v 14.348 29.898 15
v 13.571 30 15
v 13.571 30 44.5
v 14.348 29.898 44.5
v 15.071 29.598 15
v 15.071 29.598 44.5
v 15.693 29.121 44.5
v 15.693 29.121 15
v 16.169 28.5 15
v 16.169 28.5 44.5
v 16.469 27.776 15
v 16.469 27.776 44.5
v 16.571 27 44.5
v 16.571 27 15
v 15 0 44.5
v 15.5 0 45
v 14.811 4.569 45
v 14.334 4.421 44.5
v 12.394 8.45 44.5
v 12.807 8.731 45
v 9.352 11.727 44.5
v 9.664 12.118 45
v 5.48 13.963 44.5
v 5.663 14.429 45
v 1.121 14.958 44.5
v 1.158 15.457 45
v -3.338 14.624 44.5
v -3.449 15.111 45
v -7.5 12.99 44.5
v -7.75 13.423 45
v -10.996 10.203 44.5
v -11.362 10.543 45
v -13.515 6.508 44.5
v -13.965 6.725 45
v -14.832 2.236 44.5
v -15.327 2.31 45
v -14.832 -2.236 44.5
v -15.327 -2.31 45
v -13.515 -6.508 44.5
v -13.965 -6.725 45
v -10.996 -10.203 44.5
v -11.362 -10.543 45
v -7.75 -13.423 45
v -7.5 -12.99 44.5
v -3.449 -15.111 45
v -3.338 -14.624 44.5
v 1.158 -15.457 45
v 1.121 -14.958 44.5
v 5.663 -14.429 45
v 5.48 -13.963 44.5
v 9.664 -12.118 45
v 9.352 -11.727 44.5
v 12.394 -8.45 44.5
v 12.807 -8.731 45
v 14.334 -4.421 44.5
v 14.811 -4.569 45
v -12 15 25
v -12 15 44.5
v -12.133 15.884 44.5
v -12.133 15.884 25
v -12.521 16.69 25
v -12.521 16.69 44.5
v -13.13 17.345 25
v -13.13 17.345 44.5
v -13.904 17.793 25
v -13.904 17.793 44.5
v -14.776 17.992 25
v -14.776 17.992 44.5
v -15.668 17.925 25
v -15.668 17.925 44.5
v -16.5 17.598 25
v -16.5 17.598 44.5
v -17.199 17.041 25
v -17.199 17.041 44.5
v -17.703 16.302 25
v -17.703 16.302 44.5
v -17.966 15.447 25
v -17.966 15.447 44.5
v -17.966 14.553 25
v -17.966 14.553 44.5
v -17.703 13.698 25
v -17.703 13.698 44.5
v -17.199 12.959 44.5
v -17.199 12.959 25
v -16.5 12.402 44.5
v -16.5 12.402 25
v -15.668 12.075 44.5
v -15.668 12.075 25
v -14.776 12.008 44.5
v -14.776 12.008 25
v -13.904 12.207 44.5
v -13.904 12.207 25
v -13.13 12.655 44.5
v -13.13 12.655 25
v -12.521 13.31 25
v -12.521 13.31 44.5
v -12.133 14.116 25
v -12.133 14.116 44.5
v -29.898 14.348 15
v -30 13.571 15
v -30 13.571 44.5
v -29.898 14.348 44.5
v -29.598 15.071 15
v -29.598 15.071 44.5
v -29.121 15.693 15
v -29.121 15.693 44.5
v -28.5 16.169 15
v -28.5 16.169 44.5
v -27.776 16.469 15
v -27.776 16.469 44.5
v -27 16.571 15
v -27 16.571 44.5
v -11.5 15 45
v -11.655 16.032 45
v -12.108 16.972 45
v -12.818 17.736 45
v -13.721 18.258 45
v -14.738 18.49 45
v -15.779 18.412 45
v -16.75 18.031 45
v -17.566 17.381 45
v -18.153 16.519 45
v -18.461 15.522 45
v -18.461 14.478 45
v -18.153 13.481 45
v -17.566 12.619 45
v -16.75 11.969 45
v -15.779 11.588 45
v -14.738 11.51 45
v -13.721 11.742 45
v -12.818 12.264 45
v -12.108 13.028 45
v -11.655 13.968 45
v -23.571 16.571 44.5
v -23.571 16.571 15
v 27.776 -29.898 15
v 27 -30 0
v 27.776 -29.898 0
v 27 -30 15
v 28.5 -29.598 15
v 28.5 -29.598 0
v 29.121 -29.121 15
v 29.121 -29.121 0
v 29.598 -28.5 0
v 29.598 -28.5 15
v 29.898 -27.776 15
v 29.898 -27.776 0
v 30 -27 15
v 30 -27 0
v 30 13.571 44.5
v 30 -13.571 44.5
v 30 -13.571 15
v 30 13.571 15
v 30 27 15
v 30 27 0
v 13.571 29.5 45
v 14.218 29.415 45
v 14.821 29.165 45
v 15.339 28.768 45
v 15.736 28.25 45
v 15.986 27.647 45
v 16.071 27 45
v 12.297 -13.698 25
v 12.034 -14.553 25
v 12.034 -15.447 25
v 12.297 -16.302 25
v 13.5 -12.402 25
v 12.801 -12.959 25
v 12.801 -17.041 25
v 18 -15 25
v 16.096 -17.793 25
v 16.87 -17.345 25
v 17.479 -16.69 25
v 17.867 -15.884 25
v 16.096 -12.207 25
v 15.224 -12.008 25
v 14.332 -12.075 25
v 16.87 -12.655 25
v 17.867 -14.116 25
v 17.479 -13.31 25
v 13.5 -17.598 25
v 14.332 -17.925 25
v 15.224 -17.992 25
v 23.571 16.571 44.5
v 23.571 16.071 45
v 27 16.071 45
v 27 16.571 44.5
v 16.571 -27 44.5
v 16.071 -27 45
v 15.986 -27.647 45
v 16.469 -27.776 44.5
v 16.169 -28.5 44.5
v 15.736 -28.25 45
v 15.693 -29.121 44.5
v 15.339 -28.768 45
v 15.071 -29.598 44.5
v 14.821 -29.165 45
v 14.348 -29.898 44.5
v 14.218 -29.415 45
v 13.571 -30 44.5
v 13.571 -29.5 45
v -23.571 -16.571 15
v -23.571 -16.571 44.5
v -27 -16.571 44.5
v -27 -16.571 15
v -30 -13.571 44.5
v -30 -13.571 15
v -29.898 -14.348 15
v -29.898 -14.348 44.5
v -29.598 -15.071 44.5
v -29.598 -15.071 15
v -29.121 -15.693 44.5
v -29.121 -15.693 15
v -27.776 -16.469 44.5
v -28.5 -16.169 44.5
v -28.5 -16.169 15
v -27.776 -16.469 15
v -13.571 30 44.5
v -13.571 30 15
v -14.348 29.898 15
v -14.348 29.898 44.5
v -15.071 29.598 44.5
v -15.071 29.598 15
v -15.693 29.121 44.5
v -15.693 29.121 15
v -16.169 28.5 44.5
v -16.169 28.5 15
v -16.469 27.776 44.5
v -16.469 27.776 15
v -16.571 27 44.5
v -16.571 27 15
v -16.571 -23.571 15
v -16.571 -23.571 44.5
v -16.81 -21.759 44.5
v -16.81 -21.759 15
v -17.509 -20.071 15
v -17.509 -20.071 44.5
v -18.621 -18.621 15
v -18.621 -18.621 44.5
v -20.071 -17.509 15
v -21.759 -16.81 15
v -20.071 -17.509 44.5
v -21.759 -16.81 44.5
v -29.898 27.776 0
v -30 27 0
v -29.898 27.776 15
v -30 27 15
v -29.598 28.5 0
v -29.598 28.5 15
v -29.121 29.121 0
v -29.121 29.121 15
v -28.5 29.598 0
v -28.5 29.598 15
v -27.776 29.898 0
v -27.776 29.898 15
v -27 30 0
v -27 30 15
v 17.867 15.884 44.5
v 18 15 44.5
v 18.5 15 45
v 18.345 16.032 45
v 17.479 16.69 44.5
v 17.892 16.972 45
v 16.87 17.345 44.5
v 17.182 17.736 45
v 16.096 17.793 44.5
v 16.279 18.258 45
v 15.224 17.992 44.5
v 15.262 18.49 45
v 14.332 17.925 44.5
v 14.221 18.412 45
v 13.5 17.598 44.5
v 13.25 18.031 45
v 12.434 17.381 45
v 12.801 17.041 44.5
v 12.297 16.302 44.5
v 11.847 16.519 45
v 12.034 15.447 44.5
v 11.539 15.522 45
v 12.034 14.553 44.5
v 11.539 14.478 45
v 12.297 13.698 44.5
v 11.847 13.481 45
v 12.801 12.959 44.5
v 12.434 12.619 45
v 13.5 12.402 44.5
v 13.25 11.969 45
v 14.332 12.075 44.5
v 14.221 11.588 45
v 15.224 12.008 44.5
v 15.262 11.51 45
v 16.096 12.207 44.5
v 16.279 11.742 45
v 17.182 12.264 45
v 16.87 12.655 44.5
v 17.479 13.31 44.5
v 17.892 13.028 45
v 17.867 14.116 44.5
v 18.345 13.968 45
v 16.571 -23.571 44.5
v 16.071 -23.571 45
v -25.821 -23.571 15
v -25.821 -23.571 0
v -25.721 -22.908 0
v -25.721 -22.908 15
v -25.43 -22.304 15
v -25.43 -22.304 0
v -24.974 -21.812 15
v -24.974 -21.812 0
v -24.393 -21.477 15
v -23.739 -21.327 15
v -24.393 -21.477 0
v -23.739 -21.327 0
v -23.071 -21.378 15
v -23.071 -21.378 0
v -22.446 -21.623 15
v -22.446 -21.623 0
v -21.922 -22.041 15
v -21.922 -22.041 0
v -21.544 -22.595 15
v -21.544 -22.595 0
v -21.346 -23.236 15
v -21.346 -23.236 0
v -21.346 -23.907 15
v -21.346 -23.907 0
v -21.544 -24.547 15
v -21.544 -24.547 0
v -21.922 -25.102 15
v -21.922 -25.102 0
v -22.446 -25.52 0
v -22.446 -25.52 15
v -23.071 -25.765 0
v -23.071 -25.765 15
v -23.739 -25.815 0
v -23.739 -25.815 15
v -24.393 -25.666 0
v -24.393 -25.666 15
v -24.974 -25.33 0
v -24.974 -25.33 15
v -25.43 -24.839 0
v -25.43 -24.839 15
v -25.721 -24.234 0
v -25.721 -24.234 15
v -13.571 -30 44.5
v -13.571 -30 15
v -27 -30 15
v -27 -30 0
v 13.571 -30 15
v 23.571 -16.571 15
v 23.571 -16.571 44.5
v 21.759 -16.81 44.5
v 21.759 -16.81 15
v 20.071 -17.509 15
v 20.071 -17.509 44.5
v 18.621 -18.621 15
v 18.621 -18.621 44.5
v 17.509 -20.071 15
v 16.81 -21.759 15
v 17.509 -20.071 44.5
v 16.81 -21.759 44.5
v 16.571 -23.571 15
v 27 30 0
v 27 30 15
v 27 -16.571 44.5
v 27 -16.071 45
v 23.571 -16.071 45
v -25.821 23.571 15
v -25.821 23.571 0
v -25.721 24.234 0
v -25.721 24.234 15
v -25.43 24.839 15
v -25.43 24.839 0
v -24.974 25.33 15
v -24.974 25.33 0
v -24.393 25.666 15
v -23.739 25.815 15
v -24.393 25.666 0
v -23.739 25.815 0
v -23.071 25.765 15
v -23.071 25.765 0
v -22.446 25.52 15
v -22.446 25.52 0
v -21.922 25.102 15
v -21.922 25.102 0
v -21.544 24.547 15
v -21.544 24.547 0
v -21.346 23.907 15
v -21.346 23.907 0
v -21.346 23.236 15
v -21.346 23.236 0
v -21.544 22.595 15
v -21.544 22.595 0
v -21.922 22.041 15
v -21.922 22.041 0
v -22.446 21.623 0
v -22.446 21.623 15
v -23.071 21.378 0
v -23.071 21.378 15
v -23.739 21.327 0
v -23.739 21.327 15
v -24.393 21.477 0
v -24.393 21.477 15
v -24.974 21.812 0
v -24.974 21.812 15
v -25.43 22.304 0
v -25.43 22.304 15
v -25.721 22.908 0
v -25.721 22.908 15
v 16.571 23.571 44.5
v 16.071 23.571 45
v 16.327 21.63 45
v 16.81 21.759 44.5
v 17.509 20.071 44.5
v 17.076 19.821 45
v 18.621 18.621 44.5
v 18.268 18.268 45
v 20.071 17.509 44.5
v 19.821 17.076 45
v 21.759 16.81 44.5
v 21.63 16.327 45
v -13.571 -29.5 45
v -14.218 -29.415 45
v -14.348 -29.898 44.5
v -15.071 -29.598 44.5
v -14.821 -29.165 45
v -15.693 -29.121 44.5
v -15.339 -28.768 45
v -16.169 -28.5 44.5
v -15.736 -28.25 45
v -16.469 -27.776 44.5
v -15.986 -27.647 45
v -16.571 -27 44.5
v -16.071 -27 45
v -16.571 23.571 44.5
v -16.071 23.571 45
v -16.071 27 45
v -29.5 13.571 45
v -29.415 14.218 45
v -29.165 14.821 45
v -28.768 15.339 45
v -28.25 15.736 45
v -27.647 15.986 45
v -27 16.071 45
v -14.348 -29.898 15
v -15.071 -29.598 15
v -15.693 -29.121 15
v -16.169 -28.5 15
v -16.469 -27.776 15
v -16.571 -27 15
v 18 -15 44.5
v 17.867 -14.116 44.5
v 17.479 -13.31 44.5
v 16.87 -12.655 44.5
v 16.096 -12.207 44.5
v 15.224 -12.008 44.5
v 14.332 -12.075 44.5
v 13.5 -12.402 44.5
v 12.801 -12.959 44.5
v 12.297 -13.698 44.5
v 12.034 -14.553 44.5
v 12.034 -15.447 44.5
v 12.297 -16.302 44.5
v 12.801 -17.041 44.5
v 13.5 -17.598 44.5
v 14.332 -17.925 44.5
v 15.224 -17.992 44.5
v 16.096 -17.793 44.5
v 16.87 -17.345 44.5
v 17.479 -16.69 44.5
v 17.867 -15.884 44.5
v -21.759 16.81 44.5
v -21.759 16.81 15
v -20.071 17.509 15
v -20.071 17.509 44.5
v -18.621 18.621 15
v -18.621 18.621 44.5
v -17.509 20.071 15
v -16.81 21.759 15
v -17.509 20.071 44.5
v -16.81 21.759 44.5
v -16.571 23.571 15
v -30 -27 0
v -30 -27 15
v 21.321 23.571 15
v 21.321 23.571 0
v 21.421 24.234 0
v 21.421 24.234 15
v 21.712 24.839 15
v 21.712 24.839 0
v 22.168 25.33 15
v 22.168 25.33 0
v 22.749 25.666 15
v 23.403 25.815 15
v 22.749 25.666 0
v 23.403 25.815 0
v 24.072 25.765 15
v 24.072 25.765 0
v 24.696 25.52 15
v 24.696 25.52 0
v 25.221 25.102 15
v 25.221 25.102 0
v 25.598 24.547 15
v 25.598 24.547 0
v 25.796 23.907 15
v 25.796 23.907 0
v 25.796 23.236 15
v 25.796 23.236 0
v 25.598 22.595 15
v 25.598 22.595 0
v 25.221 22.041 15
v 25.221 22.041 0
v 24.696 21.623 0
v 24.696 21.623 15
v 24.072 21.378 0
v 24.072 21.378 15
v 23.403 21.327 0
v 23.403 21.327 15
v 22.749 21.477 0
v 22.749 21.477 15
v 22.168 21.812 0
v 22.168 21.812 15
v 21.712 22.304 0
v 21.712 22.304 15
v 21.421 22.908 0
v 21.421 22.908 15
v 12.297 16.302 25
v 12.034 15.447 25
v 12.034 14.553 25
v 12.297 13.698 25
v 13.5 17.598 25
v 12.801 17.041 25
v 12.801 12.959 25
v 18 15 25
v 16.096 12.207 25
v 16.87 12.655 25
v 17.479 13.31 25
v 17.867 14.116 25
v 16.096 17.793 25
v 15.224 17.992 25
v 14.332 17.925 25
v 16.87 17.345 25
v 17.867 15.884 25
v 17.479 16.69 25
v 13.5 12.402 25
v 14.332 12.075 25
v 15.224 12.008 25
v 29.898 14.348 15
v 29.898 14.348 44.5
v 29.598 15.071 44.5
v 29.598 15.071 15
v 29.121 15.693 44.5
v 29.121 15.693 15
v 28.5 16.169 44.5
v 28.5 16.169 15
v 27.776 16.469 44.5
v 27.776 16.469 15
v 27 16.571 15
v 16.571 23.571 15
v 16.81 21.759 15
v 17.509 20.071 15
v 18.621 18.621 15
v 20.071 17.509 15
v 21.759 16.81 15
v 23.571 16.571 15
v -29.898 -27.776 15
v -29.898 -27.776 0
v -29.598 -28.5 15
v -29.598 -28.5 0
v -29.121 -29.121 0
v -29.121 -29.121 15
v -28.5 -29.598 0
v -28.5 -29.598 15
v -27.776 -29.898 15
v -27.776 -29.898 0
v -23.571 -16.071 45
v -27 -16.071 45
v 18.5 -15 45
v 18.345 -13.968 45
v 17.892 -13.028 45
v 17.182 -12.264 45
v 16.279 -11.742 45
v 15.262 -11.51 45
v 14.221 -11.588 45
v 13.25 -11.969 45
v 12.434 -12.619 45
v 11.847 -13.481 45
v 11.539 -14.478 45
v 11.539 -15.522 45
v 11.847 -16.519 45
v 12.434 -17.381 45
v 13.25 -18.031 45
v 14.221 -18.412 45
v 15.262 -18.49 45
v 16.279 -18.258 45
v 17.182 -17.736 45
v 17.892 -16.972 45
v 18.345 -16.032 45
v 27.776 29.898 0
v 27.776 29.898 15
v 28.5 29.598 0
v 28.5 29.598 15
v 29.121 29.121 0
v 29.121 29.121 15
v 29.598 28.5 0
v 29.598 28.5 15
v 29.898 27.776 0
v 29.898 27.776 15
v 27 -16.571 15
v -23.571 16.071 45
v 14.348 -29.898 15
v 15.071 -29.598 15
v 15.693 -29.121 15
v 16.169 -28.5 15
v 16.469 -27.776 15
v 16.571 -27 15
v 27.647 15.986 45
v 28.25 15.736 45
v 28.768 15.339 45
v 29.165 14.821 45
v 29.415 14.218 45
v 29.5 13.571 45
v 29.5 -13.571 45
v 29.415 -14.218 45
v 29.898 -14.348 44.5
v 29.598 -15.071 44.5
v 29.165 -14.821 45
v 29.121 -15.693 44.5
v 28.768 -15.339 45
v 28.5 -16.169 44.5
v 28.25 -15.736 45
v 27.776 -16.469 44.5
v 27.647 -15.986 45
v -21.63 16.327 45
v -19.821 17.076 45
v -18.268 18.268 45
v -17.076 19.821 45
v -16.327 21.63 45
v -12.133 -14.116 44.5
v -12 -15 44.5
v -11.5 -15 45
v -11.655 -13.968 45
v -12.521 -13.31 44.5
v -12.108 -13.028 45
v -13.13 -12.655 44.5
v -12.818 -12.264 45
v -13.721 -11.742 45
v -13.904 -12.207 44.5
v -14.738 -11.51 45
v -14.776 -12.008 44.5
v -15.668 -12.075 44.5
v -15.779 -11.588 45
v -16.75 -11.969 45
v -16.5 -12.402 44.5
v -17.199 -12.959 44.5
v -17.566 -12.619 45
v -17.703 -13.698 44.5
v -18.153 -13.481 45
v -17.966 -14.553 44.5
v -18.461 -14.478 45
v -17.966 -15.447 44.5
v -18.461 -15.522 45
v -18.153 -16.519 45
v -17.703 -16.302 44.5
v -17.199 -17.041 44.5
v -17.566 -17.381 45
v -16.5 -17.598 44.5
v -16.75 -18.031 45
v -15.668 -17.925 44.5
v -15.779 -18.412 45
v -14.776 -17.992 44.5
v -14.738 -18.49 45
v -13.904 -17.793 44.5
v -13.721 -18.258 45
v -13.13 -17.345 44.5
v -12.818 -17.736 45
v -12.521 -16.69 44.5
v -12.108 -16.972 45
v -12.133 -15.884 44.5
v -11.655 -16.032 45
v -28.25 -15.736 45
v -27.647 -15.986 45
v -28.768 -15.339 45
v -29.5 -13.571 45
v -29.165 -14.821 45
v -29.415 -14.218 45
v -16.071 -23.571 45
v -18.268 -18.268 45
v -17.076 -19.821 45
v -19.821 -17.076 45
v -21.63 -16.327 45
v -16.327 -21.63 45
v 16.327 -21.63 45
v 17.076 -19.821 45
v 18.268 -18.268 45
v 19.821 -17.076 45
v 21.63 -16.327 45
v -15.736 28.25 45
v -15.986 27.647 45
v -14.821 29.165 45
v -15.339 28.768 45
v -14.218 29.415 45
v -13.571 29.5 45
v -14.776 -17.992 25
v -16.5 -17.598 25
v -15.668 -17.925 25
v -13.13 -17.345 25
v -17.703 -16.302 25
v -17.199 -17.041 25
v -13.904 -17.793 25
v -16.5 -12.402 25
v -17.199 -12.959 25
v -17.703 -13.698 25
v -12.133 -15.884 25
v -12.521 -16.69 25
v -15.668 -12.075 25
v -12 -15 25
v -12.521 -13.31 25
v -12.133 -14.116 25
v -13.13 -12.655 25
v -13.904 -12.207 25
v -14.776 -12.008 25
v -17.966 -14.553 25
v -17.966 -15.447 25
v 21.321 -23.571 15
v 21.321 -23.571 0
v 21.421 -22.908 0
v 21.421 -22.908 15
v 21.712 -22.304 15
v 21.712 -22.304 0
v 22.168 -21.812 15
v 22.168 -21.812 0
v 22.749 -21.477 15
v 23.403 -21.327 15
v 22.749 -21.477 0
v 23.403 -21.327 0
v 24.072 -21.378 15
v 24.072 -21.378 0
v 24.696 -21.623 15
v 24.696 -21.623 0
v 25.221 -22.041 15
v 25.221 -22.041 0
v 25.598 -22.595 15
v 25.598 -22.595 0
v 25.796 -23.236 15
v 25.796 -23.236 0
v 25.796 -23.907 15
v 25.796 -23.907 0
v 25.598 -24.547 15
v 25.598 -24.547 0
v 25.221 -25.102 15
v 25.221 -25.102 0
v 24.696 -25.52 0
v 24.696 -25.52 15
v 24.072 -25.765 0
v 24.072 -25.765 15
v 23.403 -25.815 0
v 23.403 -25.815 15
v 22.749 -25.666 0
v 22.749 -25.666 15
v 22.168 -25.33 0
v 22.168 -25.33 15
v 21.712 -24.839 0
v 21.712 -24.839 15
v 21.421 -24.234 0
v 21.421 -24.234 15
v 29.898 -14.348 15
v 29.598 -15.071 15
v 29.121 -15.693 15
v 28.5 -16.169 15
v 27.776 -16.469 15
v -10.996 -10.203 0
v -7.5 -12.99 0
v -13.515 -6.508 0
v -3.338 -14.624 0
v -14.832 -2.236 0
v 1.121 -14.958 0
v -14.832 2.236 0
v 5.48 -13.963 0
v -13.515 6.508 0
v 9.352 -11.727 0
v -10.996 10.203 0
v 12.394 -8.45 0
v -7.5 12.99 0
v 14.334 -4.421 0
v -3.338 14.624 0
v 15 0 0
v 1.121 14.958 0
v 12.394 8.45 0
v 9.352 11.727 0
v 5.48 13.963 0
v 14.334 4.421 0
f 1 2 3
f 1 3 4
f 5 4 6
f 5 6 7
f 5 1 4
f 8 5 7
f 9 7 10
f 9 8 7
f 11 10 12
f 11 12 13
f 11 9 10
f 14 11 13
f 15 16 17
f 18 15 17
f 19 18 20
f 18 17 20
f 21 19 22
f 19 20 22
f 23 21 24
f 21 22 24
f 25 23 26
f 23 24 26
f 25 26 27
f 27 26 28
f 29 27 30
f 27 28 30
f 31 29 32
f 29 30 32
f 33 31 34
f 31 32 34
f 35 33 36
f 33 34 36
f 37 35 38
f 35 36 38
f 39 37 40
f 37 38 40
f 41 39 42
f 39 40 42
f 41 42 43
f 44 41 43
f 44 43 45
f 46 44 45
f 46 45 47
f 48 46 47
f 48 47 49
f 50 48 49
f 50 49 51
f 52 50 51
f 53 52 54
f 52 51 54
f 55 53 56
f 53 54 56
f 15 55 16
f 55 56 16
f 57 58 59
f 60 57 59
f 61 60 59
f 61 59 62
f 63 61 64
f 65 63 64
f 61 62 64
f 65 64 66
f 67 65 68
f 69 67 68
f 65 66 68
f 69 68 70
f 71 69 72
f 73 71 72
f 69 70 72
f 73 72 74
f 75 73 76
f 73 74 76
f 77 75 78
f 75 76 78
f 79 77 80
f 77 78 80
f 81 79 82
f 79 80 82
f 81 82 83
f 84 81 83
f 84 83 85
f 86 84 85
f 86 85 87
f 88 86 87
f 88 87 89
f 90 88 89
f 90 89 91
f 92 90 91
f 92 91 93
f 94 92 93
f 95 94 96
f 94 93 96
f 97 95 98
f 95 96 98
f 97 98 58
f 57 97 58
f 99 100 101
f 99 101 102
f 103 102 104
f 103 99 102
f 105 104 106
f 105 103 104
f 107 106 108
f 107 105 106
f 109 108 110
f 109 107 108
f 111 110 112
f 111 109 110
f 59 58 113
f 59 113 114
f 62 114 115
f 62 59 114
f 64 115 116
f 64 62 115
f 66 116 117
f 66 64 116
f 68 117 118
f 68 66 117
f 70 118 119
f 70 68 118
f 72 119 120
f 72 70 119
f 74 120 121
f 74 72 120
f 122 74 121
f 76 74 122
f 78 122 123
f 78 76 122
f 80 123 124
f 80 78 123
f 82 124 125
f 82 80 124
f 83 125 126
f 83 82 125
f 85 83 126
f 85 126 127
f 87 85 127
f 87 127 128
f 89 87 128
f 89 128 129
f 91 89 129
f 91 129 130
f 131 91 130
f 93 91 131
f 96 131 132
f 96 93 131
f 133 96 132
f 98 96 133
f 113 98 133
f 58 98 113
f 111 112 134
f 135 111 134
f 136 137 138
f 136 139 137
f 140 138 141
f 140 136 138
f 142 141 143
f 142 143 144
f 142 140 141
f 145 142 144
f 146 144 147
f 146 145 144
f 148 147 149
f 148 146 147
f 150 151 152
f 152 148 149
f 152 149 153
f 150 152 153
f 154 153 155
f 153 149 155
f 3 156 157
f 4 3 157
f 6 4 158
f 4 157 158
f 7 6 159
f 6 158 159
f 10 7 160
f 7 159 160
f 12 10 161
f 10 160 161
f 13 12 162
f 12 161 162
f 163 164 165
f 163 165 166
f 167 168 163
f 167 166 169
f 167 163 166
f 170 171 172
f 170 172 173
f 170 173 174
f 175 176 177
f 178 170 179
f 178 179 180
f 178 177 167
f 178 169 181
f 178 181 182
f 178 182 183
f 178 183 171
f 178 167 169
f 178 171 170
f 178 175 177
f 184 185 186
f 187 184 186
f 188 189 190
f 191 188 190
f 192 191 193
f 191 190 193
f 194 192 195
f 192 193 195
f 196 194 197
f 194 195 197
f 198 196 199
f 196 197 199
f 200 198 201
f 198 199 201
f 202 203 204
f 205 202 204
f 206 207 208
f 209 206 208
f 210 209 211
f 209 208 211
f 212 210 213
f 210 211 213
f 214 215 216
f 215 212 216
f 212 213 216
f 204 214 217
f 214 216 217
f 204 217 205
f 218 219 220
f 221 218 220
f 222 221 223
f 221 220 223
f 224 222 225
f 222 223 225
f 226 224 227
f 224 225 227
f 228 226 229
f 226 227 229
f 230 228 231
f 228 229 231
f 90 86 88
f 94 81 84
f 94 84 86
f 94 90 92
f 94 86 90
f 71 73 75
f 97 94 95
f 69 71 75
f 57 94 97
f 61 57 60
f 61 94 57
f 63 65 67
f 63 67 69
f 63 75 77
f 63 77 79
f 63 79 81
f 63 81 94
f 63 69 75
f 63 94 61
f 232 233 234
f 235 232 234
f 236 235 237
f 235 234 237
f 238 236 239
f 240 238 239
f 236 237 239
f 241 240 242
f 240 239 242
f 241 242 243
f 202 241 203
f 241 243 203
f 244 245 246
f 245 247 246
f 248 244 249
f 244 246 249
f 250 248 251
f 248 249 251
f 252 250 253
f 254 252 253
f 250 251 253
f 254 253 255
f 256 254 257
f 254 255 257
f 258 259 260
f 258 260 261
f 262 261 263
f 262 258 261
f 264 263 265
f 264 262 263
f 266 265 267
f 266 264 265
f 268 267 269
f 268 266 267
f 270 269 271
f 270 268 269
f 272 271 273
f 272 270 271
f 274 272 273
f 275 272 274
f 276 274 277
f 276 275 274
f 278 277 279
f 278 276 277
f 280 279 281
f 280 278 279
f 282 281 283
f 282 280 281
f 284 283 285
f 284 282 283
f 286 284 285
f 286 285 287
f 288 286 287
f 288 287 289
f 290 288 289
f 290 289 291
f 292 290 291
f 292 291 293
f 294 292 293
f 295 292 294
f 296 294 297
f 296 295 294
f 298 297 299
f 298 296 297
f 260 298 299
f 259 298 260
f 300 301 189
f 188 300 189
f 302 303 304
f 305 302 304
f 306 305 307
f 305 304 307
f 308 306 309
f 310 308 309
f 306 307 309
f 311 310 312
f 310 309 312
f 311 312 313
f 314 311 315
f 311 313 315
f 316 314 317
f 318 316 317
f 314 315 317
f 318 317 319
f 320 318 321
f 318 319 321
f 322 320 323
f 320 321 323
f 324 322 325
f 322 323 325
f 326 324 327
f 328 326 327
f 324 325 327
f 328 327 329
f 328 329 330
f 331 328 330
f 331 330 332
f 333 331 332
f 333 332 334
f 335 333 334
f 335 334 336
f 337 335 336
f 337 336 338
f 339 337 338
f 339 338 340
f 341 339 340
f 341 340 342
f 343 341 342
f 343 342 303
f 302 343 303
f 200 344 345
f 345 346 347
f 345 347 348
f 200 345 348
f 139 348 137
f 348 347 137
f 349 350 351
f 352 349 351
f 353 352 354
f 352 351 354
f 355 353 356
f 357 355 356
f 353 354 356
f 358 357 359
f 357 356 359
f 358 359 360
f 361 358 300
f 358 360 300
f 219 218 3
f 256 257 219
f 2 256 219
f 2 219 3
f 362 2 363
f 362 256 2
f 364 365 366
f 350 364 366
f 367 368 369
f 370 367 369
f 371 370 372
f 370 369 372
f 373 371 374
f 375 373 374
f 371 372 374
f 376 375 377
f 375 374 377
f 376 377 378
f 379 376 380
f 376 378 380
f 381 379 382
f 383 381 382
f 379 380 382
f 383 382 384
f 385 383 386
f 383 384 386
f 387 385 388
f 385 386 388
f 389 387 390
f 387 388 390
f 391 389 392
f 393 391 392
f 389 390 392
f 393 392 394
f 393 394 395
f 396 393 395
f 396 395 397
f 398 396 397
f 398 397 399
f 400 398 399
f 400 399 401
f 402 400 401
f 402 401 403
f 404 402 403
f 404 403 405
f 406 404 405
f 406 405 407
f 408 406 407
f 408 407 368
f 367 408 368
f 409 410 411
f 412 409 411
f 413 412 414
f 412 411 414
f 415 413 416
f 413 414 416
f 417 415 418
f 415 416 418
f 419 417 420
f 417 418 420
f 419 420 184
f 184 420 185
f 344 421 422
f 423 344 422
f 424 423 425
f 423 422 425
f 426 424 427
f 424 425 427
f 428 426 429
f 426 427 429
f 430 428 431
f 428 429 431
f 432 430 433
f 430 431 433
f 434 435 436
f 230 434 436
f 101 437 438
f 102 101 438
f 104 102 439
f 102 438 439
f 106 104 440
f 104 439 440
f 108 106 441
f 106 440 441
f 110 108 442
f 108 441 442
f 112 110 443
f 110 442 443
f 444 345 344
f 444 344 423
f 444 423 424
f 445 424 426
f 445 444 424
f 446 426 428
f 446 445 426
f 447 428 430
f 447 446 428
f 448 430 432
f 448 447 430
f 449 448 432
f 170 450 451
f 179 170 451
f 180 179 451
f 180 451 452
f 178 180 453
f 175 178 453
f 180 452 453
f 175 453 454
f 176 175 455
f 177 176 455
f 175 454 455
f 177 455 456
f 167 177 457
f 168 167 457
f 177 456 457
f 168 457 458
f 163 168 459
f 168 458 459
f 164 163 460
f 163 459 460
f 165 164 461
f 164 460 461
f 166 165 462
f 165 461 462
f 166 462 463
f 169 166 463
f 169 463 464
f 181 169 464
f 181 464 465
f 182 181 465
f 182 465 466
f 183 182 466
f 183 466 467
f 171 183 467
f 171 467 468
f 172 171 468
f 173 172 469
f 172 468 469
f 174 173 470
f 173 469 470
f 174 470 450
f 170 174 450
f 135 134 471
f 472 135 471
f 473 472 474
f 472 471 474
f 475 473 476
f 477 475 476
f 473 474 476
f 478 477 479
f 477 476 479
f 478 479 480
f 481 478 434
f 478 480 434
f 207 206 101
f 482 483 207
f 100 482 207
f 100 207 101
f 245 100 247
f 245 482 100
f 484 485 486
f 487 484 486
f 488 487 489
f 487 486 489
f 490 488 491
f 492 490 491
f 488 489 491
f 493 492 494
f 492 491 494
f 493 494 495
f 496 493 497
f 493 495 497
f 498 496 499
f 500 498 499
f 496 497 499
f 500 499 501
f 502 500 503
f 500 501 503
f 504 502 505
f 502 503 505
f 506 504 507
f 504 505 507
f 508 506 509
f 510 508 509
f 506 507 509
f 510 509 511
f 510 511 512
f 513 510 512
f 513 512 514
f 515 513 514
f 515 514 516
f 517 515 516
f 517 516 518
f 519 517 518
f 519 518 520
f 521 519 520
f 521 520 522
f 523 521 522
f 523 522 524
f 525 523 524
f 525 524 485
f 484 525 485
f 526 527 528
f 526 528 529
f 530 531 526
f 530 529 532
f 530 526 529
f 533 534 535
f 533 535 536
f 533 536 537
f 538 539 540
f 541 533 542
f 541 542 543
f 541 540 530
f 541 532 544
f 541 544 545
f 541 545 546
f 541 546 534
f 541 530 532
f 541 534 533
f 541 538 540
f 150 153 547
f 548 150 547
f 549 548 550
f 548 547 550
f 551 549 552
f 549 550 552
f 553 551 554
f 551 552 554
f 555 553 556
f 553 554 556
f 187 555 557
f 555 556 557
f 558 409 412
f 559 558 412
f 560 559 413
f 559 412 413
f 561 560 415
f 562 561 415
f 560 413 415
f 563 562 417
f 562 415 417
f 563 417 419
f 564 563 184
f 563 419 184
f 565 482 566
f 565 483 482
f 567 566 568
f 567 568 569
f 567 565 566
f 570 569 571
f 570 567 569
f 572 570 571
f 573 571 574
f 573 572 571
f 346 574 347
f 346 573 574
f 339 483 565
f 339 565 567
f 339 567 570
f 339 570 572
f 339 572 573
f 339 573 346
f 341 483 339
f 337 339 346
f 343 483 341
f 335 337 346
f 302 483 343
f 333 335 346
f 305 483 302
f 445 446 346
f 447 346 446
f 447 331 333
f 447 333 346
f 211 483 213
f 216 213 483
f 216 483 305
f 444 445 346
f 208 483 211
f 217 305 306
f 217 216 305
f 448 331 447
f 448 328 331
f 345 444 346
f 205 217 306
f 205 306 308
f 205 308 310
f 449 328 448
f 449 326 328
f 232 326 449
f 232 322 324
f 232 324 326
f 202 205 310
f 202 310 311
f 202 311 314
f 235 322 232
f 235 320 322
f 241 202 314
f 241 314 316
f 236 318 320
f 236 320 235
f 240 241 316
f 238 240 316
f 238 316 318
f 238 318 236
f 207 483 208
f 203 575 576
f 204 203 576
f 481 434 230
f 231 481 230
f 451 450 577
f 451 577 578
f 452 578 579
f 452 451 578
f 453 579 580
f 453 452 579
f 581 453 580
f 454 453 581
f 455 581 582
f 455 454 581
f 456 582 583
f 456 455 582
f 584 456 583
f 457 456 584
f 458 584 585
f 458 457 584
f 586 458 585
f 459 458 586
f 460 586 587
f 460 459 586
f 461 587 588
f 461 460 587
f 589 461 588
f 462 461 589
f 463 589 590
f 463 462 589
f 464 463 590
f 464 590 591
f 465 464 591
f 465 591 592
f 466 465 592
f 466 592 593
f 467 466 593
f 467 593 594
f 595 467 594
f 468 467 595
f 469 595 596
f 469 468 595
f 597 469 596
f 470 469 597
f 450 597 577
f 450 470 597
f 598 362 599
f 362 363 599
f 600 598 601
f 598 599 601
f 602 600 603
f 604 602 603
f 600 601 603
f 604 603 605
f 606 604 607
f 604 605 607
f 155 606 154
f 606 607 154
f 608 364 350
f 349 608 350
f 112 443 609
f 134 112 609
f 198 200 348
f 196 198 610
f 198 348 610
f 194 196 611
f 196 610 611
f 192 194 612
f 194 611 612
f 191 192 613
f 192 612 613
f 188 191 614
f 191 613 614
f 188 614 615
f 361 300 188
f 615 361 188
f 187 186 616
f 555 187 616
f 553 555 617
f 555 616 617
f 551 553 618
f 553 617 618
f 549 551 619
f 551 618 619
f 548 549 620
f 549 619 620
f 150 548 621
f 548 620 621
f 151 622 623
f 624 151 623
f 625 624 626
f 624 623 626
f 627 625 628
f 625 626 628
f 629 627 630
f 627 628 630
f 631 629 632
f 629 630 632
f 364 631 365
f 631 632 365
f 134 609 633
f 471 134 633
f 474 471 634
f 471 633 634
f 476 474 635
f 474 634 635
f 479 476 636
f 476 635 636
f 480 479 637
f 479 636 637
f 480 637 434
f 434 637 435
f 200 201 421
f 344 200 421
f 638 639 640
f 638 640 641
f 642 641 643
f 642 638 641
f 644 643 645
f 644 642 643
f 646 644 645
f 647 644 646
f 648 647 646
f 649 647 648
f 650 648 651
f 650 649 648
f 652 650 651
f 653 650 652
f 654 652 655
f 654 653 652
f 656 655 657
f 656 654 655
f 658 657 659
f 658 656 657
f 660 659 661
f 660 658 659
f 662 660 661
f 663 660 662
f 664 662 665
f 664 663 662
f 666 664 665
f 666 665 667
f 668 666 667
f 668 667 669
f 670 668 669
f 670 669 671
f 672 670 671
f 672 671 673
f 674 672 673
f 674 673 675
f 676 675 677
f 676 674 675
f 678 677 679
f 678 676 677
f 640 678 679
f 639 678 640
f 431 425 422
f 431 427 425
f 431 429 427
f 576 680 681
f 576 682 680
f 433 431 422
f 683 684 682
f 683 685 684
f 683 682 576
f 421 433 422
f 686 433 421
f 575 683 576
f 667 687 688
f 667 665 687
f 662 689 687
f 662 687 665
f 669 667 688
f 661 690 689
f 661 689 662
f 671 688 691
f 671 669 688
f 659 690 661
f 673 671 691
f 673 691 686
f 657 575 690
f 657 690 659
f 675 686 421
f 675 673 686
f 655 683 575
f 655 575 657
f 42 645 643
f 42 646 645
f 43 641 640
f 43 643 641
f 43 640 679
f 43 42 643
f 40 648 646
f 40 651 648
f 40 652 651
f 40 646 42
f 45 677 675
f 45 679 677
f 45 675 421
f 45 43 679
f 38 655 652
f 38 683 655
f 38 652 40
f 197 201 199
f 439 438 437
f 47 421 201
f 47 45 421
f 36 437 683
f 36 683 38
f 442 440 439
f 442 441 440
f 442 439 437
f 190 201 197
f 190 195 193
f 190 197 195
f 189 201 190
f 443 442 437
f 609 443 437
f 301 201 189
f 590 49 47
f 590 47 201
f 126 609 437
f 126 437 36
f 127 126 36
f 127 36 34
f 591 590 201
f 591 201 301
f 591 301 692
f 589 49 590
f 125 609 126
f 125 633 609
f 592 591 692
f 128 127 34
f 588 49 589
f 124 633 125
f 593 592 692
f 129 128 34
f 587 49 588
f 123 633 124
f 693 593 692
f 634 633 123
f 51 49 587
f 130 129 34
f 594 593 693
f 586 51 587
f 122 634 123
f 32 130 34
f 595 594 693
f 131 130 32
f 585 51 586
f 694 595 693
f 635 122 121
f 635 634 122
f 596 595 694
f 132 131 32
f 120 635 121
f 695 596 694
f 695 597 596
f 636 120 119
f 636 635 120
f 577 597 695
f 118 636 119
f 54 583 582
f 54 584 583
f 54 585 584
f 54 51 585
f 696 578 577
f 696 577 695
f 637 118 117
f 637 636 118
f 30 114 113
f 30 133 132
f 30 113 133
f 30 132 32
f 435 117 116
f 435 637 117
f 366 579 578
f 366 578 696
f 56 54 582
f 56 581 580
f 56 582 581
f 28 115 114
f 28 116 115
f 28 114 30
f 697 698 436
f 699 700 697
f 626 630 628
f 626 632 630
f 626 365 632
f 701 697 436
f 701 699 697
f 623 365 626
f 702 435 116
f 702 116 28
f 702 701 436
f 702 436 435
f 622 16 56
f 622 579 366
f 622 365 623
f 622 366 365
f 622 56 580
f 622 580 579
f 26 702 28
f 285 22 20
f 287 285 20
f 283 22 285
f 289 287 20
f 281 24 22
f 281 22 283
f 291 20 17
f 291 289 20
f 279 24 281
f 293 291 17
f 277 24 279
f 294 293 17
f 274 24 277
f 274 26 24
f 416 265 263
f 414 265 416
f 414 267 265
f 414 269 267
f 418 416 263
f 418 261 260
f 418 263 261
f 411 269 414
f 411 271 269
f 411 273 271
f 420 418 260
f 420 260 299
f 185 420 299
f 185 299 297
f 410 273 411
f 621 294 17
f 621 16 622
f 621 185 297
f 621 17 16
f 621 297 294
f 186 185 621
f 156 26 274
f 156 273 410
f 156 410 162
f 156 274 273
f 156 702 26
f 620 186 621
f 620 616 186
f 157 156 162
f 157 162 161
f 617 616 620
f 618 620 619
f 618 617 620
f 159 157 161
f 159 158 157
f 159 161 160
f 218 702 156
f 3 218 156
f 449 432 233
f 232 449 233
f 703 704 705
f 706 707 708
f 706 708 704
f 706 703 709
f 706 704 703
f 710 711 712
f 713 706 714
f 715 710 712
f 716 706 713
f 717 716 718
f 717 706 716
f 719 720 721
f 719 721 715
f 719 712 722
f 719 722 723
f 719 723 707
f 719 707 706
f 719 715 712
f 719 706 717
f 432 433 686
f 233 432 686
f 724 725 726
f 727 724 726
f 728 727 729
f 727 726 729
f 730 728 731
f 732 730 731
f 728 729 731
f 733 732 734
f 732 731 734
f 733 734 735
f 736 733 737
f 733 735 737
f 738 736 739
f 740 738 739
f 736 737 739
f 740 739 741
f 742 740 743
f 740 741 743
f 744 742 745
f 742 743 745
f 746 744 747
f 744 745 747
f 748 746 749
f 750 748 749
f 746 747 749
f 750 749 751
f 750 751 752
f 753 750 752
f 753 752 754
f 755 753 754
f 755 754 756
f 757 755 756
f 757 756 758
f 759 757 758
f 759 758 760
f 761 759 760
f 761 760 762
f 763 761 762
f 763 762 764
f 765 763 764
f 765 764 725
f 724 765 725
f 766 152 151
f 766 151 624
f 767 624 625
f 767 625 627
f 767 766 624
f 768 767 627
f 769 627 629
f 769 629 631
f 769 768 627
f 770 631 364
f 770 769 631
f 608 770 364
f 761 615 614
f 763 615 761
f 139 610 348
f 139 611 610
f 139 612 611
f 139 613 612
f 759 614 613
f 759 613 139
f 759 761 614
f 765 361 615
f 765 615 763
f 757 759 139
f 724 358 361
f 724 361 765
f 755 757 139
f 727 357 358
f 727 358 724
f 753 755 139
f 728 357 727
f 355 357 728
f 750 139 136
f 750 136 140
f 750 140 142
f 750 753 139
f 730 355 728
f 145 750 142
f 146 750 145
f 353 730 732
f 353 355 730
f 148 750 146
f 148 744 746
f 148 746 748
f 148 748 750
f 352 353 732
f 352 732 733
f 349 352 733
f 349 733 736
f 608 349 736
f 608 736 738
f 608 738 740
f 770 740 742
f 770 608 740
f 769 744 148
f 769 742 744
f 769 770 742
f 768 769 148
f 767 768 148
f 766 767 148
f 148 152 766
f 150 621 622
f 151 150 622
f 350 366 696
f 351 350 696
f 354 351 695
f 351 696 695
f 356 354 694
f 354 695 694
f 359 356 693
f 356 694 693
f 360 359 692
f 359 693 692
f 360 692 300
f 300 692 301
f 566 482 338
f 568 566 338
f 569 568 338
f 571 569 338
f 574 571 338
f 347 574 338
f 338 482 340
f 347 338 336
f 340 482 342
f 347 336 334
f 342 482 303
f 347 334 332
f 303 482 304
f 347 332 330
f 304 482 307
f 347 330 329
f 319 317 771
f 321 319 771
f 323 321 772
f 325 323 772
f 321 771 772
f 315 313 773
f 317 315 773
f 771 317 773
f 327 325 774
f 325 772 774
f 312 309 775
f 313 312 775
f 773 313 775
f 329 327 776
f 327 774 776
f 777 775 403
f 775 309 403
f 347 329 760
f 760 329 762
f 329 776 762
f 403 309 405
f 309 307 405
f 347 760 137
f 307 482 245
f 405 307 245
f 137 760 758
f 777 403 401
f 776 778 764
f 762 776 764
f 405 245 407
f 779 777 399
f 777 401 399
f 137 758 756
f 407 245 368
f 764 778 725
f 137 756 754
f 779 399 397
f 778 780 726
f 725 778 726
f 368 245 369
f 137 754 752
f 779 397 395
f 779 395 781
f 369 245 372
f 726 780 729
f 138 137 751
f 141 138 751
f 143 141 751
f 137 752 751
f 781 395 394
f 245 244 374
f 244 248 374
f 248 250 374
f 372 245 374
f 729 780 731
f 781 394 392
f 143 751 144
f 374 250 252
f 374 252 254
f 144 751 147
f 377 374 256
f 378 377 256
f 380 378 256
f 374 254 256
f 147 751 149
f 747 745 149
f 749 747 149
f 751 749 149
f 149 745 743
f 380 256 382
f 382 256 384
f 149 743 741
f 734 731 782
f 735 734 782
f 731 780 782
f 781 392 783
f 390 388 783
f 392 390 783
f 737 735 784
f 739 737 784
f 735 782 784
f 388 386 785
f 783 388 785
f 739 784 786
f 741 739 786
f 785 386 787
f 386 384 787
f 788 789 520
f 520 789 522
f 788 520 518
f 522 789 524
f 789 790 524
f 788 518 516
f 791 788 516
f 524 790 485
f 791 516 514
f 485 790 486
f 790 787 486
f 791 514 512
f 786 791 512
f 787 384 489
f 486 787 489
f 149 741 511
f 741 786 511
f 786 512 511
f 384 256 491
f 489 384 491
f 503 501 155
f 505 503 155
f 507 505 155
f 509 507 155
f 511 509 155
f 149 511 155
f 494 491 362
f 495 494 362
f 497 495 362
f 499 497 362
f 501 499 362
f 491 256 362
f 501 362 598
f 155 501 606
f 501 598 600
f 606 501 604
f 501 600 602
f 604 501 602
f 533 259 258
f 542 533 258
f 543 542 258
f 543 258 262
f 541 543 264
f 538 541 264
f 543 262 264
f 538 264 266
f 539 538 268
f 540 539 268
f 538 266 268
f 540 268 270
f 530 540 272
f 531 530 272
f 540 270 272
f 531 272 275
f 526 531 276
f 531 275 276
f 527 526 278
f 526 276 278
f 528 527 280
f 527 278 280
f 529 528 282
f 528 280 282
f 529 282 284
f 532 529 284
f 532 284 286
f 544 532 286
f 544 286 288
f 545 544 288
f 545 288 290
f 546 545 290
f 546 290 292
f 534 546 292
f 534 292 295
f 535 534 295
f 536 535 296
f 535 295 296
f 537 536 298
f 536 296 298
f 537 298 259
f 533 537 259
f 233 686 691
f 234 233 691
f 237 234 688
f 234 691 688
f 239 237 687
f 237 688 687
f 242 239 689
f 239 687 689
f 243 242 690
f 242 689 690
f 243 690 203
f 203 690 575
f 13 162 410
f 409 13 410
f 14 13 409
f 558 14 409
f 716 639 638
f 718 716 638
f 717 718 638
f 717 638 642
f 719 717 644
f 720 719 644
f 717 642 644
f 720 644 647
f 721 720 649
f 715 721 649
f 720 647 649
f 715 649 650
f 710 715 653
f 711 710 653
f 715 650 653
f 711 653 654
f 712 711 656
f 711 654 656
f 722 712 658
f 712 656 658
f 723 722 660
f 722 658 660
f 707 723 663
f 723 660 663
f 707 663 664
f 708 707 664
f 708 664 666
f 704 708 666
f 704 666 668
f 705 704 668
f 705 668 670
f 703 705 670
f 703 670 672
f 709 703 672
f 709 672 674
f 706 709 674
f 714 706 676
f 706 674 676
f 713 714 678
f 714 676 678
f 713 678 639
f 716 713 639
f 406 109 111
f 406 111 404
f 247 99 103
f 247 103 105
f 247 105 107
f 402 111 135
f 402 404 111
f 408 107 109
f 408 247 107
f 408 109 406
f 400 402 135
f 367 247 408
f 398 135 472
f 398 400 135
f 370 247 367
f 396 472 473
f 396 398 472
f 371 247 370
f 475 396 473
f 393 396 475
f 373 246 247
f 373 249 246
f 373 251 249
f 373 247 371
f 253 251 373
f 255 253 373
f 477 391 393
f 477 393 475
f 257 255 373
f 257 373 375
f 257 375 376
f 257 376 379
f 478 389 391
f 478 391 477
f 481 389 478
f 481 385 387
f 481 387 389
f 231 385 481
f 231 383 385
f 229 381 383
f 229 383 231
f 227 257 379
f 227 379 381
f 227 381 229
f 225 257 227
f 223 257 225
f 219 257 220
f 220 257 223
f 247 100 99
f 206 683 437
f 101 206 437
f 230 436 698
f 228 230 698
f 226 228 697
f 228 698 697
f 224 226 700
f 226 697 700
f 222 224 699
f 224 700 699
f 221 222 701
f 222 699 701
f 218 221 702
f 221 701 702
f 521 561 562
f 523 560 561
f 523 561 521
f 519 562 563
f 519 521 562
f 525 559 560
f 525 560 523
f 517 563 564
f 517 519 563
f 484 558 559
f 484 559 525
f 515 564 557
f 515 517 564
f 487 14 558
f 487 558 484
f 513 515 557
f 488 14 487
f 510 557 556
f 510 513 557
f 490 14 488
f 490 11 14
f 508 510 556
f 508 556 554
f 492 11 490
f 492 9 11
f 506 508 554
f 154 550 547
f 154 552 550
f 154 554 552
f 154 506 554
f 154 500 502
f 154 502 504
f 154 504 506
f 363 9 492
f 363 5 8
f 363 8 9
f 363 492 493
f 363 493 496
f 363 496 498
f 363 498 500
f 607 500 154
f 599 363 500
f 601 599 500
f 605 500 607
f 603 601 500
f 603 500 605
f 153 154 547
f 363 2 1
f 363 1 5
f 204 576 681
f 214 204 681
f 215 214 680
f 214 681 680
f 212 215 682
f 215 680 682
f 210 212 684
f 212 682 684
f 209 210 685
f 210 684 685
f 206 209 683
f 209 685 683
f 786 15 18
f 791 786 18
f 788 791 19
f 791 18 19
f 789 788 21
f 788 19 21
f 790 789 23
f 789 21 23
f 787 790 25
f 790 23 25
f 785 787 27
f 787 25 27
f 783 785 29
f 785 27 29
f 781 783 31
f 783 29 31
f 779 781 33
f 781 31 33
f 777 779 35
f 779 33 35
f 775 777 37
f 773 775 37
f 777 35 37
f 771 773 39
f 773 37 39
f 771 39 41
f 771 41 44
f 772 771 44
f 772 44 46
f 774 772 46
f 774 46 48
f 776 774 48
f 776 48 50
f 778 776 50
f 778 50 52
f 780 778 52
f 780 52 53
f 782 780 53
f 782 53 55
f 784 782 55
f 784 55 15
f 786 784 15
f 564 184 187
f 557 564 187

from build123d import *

# Parameters (mm, degrees)
SKETCH1_W                = 60
SKETCH1_H                = 60
BOSS_EXTRUDE1_DEPTH      = 45
CUT_EXTRUDE1_DEPTH       = 30
FILLET1_R                = 3
SKETCH4_R                = 15
CUT_EXTRUDE2_DEPTH       = 46
M4_CLEARANCE_HOLE1_D     = 4.5
M4_CLEARANCE_HOLE1_DEPTH = 15
SKETCH6_R                = 3
CUT_EXTRUDE3_DEPTH       = 20
FILLET2_R                = 3
CHAMFER1_SIZE            = 0.5


with BuildPart() as part:
    # Sketch1 → Boss-Extrude1 (new body)
    with BuildSketch(Plane.XY):
        Rectangle(SKETCH1_W, SKETCH1_H)
    extrude(amount=BOSS_EXTRUDE1_DEPTH)

    # Sketch3 → Cut-Extrude1 (cut)
    with BuildSketch(Plane.XY.offset(45)):
        with BuildLine():
            ThreePointArc((-23.5712, 16.5712), (-18.621452532, 18.621452532), (-16.5712, 23.5712))
            Line((-16.5712, 23.5712), (-16.5712, 30))
            Line((-16.5712, 30), (-30, 30))
            Line((-30, 30), (-30, 16.5712))
            Line((-30, 16.5712), (-23.5712, 16.5712))
        make_face()
        with BuildLine():
            Line((30, 30), (16.5712, 30))
            Line((16.5712, 30), (16.5712, 23.5712))
            ThreePointArc((16.5712, 23.5712), (18.621452532, 18.621452532), (23.5712, 16.5712))
            Line((23.5712, 16.5712), (30, 16.5712))
            Line((30, 16.5712), (30, 30))
        make_face()
        with BuildLine():
            Line((30, -30), (30, -16.5712))
            Line((30, -16.5712), (23.5712, -16.5712))
            ThreePointArc((23.5712, -16.5712), (18.621452532, -18.621452532), (16.5712, -23.5712))
            Line((16.5712, -23.5712), (16.5712, -30))
            Line((16.5712, -30), (30, -30))
        make_face()
        with BuildLine():
            Line((-23.5712, -16.5712), (-30, -16.5712))
            Line((-30, -16.5712), (-30, -30))
            Line((-30, -30), (-16.5712, -30))
            Line((-16.5712, -30), (-16.5712, -23.5712))
            ThreePointArc((-16.5712, -23.5712), (-18.621452532, -18.621452532), (-23.5712, -16.5712))
        make_face()
    extrude(amount=-CUT_EXTRUDE1_DEPTH, mode=Mode.SUBTRACT)

    # Fillet1
    fillet1_edges = [part.edges().sort_by_distance(p)[0] for p in [
        (-30, 30, 7.5),
        (30, 30, 7.5),
        (30, -30, 7.5),
        (-30, -30, 7.5),
    ]]
    fillet(fillet1_edges, radius=FILLET1_R)

    # Sketch4 → Cut-Extrude2 (cut, through all)
    with BuildSketch(Plane.XY.offset(45)):
        Circle(SKETCH4_R)
    extrude(amount=-CUT_EXTRUDE2_DEPTH, mode=Mode.SUBTRACT)

    # M4 Clearance Hole1
    with Locations(Plane(origin=(-23.5712, 23.5712, 15), x_dir=(1, 0, 0), z_dir=(0, 0, 1))):
        with Locations((0, 0), (47.1424, 0), (47.1424, -47.1424), (0, -47.1424)):
            Hole(M4_CLEARANCE_HOLE1_D / 2, depth=M4_CLEARANCE_HOLE1_DEPTH)

    # Sketch6 → Cut-Extrude3 (cut)
    with BuildSketch(Plane.XY.offset(45)):
        with Locations((-15, 15)):
            Circle(SKETCH6_R)
        with Locations((-15, -15)):
            Circle(SKETCH6_R)
        with Locations((15, -15)):
            Circle(SKETCH6_R)
        with Locations((15, 15)):
            Circle(SKETCH6_R)
    extrude(amount=-CUT_EXTRUDE3_DEPTH, mode=Mode.SUBTRACT)

    # Fillet2
    fillet2_edges = [part.edges().sort_by_distance(p)[0] for p in [
        (-16.5712, 30, 30),
        (-30, 16.5712, 30),
        (30, 16.5712, 30),
        (16.5712, 30, 30),
        (16.5712, -30, 30),
        (30, -16.5712, 30),
        (-30, -16.5712, 30),
        (-16.5712, -30, 30),
    ]]
    fillet(fillet2_edges, radius=FILLET2_R)

    # Chamfer1
    chamfer1_edges = [part.edges().sort_by_distance(p)[0] for p in [
        (-15, 0, 45),
        (-18, 15, 45),
        (-18, -15, 45),
        (12, -15, 45),
        (12, 15, 45),
        (-30, 0, 45),
        (0, -30, 45),
        (30, 0, 45),
        (0, 30, 45),
        (-29.121320344, -15.692520344, 45),
        (-15.692520344, -29.121320344, 45),
        (15.692520344, -29.121320344, 45),
        (29.121320344, -15.692520344, 45),
        (29.121320344, 15.692520344, 45),
        (15.692520344, 29.121320344, 45),
        (-15.692520344, 29.121320344, 45),
        (-29.121320344, 15.692520344, 45),
        (-16.5712, 25.2856, 45),
        (-25.2856, 16.5712, 45),
        (-18.621452532, 18.621452532, 45),
        (18.621452532, 18.621452532, 45),
        (25.2856, 16.5712, 45),
        (16.5712, 25.2856, 45),
        (18.621452532, -18.621452532, 45),
        (16.5712, -25.2856, 45),
        (25.2856, -16.5712, 45),
        (-25.2856, -16.5712, 45),
        (-16.5712, -25.2856, 45),
        (-18.621452532, -18.621452532, 45),
    ]]
    chamfer(chamfer1_edges, length=CHAMFER1_SIZE)


solid = part.part
